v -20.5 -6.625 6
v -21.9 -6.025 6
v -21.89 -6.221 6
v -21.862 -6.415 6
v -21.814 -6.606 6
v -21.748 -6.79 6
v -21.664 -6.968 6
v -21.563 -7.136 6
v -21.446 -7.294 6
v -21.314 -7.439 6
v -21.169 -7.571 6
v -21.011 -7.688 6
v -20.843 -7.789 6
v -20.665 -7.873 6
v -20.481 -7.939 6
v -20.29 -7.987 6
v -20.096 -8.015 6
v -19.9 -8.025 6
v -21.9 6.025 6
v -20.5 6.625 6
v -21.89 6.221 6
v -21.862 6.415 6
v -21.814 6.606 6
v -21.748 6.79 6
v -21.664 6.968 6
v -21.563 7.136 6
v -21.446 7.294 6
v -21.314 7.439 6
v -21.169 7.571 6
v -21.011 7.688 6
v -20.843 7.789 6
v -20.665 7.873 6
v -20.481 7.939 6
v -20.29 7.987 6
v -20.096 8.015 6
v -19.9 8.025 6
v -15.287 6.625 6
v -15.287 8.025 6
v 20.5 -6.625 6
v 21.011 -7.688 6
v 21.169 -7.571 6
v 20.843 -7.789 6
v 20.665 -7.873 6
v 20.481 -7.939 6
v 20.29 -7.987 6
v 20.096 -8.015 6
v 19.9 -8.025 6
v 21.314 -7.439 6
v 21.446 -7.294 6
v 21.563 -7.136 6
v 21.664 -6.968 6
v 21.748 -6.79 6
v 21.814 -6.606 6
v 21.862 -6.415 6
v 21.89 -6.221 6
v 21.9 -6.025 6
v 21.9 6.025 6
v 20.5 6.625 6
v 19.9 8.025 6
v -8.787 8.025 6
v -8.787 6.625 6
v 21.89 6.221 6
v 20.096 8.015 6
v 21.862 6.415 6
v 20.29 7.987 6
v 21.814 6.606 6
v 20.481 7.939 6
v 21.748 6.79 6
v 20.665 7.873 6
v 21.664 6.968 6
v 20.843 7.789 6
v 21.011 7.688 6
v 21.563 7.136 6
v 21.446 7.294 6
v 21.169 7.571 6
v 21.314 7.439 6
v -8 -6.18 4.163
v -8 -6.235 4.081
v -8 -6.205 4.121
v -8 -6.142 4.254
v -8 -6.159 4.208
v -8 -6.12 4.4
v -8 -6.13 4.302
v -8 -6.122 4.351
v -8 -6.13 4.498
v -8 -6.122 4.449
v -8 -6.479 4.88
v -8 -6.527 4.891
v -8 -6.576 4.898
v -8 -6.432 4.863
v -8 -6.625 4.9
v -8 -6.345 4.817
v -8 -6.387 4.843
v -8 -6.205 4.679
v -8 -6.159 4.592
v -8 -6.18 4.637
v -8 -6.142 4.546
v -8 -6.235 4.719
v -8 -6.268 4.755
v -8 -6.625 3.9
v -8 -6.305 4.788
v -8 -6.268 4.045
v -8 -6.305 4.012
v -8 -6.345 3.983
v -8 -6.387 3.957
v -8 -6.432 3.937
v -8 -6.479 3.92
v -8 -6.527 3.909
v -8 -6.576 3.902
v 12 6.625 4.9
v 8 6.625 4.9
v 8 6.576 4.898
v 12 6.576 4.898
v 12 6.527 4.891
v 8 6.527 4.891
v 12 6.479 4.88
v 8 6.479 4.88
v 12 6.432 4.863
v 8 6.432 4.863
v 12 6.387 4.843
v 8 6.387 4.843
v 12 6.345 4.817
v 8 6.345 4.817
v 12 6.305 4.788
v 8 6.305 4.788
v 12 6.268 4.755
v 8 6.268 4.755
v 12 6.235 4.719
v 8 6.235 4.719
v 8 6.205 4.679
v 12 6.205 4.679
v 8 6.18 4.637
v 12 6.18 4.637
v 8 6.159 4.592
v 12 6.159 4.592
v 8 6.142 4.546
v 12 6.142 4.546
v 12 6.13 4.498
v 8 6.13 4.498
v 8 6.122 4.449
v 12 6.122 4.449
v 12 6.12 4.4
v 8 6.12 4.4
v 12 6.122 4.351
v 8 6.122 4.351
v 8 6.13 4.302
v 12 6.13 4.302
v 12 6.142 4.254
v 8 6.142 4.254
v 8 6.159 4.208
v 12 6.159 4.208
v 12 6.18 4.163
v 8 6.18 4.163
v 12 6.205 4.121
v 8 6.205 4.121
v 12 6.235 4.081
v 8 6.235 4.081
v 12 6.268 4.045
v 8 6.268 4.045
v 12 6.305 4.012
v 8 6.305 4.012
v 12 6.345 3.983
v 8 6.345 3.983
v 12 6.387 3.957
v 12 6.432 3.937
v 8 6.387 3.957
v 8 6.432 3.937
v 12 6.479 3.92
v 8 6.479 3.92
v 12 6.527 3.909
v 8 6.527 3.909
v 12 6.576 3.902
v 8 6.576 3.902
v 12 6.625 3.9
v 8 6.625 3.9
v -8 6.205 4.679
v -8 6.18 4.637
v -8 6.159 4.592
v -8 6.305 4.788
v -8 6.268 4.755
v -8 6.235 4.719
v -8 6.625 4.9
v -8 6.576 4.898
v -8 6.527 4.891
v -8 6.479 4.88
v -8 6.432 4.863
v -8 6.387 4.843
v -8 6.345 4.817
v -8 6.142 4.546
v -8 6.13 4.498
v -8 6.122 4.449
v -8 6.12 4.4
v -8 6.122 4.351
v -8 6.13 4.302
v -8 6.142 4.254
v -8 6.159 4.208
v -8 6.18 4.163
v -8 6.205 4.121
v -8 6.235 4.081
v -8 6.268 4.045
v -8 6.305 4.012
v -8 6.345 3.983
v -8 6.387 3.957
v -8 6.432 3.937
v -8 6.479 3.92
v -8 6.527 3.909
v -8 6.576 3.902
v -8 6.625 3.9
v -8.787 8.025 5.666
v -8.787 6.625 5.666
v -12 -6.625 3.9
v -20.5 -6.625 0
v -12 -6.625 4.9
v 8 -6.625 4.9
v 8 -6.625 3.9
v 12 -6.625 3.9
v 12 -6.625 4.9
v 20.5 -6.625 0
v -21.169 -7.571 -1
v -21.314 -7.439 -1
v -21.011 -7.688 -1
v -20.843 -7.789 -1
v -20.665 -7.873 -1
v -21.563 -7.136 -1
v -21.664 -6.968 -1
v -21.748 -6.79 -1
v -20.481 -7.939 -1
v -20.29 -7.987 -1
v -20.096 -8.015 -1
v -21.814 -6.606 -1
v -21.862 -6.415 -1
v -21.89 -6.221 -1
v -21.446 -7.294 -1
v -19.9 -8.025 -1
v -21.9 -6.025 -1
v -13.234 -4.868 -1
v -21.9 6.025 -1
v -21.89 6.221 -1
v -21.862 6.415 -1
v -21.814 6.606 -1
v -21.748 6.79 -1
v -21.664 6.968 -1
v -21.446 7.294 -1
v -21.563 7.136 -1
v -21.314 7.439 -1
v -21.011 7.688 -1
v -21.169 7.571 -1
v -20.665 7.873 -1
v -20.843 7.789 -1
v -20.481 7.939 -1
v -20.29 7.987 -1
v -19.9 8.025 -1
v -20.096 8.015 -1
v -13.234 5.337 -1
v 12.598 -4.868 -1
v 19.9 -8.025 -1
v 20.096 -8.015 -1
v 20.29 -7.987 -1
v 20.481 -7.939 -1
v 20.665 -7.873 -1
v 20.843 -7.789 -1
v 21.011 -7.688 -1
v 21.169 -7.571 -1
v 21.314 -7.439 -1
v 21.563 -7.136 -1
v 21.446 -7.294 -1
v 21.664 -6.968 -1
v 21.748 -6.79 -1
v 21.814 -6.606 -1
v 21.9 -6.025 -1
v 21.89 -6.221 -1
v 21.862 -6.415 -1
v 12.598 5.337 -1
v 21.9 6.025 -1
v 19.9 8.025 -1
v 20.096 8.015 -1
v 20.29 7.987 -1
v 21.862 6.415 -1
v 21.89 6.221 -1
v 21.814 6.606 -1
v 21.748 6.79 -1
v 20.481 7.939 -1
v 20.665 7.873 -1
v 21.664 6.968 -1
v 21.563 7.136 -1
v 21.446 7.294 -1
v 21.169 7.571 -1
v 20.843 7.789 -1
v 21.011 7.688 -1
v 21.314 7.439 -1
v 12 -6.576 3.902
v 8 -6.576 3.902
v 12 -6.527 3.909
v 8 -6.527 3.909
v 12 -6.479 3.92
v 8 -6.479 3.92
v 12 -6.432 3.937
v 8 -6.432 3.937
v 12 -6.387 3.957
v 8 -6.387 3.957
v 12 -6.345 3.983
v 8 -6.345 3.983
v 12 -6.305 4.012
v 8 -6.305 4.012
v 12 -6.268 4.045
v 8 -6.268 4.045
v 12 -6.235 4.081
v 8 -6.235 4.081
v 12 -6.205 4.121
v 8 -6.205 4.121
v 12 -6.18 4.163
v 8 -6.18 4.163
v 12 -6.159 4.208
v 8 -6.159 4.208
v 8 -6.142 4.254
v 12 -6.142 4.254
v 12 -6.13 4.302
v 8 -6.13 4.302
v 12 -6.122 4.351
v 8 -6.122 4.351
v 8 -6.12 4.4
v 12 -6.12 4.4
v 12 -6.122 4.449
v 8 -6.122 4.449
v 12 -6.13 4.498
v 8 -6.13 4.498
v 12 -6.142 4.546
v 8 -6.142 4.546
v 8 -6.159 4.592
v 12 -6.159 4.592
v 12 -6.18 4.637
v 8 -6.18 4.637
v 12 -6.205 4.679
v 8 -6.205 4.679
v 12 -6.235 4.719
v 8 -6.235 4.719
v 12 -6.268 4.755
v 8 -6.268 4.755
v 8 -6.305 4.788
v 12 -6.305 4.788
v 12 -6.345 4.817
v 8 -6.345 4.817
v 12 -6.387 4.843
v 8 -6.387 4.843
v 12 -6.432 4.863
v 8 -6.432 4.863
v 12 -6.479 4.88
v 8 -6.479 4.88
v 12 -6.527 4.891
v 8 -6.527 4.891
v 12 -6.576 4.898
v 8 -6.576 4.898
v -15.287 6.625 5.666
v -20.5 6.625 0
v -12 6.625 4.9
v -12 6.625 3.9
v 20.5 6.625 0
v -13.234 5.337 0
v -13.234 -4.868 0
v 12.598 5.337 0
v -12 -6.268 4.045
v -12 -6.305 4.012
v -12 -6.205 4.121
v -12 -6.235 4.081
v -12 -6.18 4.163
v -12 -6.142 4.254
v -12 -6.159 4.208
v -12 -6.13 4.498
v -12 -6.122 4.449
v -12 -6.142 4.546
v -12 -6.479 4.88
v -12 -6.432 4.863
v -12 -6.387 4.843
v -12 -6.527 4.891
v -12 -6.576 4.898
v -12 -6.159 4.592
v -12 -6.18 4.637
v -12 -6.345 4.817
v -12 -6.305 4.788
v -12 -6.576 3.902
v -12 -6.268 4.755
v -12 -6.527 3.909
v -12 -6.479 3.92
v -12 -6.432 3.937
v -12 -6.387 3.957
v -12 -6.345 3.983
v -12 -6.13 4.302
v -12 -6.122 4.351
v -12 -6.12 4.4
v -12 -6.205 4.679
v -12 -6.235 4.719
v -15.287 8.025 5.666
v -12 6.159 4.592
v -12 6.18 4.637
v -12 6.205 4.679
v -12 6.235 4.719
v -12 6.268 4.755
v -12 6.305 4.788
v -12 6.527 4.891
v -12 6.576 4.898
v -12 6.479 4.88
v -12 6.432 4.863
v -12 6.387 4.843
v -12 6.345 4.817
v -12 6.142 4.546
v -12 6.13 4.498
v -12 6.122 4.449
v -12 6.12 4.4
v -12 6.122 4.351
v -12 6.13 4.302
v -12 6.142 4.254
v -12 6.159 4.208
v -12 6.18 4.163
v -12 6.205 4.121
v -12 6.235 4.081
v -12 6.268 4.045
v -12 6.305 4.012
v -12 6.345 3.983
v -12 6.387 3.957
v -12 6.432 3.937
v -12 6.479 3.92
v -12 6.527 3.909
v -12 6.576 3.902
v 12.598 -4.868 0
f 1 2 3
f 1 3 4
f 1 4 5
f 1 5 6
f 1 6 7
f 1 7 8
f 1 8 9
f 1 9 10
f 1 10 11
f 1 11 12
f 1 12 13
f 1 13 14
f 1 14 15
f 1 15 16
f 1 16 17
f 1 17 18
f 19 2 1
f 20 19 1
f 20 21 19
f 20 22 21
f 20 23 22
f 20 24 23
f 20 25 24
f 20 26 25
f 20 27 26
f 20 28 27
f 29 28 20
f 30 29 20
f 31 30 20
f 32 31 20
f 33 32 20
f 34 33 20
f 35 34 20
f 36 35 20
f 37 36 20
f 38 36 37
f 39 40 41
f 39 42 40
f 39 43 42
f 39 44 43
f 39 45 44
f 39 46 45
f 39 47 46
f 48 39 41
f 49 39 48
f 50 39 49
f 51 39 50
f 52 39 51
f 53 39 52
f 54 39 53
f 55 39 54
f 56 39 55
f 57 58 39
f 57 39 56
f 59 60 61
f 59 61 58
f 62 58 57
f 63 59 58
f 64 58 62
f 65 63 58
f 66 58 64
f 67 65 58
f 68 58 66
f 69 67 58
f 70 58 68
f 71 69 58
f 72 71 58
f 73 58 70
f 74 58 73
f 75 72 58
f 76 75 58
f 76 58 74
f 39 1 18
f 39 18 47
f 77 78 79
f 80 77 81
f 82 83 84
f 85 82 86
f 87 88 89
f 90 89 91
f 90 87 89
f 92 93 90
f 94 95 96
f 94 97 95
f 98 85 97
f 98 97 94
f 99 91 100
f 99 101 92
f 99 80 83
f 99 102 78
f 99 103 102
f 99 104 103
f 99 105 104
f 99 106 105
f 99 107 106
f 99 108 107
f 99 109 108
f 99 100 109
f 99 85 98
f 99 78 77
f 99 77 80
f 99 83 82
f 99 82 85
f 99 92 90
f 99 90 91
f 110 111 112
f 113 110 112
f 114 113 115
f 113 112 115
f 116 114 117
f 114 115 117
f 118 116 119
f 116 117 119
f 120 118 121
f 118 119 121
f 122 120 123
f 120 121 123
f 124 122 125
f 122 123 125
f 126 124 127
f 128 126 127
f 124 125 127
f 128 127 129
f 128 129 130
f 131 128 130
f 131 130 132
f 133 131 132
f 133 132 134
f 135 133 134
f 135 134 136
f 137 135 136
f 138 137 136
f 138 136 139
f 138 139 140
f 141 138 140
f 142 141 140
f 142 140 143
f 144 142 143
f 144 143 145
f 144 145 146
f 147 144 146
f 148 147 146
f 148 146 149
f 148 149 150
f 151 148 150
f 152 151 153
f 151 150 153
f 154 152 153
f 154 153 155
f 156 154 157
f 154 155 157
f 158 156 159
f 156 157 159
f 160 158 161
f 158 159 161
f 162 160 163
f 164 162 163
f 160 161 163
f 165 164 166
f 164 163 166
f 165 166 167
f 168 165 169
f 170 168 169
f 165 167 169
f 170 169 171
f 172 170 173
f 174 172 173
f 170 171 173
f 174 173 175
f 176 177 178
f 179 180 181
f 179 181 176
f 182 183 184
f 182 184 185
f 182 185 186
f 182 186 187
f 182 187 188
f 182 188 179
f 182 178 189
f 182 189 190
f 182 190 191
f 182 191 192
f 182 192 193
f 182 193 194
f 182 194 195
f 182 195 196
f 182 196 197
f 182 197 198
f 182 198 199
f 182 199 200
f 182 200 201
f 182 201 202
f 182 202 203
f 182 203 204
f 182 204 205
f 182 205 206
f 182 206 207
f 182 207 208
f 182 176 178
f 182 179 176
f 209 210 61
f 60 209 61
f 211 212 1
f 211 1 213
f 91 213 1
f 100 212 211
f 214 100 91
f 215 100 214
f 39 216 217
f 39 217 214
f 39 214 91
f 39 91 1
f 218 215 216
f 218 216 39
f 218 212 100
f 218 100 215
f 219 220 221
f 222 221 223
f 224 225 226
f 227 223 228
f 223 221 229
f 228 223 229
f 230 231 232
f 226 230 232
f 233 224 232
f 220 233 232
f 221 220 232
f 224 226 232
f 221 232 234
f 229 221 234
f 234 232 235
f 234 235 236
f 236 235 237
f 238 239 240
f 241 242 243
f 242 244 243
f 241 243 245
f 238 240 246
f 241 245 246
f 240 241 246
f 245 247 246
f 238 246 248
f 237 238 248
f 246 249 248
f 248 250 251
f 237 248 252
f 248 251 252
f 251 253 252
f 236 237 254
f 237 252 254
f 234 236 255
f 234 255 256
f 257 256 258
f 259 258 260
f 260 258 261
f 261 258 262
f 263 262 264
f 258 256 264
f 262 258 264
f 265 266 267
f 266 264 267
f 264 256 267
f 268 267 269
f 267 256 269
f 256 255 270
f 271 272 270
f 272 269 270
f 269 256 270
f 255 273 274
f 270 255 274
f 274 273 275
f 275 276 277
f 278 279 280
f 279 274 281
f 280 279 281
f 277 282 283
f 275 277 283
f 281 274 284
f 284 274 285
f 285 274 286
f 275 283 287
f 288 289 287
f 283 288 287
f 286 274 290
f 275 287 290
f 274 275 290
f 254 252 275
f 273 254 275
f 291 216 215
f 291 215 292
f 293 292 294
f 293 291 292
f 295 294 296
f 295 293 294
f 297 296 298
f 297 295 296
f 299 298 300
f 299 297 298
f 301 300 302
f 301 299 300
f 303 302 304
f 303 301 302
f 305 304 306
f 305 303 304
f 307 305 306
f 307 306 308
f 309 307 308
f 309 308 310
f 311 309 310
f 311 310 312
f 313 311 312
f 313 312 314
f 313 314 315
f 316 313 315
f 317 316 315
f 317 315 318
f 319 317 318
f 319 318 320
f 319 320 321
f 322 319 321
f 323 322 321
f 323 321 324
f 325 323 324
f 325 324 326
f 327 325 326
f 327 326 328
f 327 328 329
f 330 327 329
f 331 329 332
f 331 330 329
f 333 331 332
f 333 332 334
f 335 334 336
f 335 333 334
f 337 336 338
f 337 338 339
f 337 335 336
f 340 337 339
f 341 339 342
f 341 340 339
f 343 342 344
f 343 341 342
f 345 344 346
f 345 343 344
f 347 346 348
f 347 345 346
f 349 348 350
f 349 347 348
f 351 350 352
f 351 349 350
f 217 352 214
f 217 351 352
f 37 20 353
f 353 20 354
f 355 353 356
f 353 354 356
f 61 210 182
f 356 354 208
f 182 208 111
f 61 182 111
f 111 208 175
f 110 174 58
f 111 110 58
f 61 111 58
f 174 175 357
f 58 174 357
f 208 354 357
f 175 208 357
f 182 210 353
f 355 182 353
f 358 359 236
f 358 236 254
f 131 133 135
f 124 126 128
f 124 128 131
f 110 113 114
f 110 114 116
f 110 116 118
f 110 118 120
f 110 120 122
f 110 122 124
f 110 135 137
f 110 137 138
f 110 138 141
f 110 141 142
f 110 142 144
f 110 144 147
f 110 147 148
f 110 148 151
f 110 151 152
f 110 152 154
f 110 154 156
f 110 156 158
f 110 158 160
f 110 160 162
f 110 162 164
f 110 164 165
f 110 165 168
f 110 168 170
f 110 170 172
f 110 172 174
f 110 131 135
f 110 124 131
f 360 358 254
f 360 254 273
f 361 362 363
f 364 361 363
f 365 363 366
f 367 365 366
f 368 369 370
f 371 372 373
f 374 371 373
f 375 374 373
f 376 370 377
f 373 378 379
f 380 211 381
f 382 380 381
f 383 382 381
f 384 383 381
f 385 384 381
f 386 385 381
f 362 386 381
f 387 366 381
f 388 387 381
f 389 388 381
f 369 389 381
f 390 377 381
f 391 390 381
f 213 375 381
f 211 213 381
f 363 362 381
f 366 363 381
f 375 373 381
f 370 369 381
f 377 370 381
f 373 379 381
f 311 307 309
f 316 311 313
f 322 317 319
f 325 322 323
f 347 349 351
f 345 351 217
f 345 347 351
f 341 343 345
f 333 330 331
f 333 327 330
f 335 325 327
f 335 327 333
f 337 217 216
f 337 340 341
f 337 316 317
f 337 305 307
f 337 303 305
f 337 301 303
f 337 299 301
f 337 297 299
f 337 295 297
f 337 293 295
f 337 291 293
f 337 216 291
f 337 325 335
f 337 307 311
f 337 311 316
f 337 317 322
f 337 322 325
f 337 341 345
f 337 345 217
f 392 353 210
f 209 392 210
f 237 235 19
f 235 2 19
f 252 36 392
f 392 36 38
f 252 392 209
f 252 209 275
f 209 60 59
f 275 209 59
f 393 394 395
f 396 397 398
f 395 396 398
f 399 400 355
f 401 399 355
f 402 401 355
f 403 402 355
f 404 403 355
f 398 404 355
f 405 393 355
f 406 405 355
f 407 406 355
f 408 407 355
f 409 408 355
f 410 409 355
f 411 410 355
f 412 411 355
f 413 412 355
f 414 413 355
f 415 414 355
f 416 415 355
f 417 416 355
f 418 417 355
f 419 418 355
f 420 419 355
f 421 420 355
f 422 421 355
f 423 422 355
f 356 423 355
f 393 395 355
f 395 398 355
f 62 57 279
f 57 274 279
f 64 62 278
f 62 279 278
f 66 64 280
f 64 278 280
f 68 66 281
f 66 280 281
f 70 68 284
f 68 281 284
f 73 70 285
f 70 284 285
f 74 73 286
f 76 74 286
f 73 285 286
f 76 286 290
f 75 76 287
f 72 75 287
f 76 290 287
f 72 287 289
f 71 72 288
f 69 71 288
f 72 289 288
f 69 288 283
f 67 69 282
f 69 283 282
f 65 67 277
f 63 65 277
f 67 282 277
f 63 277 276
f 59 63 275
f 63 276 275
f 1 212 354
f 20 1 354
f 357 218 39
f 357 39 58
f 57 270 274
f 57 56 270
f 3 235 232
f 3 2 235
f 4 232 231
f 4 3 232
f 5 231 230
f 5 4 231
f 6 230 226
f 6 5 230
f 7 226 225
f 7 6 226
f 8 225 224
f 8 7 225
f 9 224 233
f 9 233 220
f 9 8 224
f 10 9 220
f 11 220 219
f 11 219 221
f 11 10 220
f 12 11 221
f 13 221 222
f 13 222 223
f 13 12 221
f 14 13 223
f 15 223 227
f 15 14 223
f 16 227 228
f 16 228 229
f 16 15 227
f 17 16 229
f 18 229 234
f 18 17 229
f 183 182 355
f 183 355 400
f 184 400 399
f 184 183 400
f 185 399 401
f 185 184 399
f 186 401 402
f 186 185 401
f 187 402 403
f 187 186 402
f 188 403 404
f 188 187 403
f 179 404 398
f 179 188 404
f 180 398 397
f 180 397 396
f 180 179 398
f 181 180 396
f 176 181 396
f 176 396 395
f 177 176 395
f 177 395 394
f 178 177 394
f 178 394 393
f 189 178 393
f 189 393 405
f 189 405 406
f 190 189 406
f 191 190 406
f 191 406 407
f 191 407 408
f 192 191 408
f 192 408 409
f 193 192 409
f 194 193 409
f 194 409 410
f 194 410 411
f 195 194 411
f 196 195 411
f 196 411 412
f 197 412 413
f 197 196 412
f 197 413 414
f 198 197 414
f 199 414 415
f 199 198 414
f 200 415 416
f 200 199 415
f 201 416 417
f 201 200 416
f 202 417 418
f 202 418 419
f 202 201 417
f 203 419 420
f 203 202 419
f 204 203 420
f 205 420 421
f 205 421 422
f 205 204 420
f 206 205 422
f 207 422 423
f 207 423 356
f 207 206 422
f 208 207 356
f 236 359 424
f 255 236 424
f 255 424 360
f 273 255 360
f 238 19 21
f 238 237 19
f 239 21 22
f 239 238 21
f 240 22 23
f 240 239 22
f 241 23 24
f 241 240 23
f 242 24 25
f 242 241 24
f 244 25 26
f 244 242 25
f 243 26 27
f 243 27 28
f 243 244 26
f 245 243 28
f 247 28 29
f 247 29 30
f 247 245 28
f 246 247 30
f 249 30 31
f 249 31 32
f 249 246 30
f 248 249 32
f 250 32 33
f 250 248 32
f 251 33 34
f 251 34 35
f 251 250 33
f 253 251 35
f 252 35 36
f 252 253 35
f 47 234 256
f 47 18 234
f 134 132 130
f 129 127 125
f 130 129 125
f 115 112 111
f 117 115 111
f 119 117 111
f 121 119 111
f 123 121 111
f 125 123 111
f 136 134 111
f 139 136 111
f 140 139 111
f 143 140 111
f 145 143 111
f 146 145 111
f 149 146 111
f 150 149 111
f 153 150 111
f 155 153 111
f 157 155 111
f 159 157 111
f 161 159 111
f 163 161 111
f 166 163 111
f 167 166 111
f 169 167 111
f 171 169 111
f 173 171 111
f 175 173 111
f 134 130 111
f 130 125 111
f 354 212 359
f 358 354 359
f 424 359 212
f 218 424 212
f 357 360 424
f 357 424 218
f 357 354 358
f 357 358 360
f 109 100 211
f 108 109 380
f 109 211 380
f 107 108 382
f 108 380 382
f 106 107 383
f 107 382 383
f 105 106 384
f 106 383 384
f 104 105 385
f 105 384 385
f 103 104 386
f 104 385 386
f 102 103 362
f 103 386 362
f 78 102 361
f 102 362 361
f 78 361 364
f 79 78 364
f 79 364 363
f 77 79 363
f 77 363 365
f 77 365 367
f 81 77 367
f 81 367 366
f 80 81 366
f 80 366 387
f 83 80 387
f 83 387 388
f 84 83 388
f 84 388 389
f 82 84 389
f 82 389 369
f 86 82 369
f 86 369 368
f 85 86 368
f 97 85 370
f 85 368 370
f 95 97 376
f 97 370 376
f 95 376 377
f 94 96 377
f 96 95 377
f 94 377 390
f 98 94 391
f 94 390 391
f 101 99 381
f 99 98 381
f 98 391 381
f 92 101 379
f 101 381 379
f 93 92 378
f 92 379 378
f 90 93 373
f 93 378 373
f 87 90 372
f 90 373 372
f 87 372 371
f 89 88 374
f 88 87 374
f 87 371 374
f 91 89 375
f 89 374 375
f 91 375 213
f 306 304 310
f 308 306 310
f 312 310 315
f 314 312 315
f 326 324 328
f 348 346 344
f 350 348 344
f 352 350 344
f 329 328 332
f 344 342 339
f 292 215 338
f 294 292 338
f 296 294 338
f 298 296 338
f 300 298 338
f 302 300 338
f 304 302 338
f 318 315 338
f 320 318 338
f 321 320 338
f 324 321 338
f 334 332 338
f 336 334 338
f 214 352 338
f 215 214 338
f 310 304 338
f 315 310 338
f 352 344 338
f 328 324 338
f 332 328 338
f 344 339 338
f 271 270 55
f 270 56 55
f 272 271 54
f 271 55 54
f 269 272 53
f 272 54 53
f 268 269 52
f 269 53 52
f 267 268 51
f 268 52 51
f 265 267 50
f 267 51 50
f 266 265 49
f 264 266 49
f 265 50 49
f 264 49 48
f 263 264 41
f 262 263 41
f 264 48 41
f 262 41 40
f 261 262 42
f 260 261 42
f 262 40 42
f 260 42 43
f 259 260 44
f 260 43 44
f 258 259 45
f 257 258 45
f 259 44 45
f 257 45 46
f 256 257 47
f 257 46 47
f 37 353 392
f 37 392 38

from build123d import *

# Parameters (mm, degrees)
SKETCH010_W     = 43.8
SKETCH010_H     = 16.05
SKETCH010_W_2   = 41
SKETCH010_H_2   = 13.25
PAD004_DEPTH    = 6
SKETCH011_W     = 43.8
SKETCH011_H     = 16.05
SKETCH011_W_2   = 25.832
SKETCH011_H_2   = 10.205235
PAD005_DEPTH    = 1
FILLET_R        = 2
SKETCH012_W     = 6.5
SKETCH012_H     = 4.714983
POCKET004_DEPTH = 8.026
SKETCH027_R     = 0.5
PAD006_DEPTH    = 2


with BuildPart() as part:
    # Sketch010 → Pad004 (new body)
    with BuildSketch(Plane.XY):
        Rectangle(SKETCH010_W, SKETCH010_H)
        Rectangle(SKETCH010_W_2, SKETCH010_H_2, mode=Mode.SUBTRACT)
    extrude(amount=PAD004_DEPTH)

    # Sketch011 → Pad005 (join)
    with BuildSketch(Plane.XY):
        Rectangle(SKETCH011_W, SKETCH011_H)
        with Locations((-0.318418, 0.23483)):
            Rectangle(SKETCH011_W_2, SKETCH011_H_2, mode=Mode.SUBTRACT)
    extrude(amount=-PAD005_DEPTH)

    # Fillet
    fillet_edges = [part.edges().sort_by_distance(p)[0] for p in [
        (-21.9, -8.025, 3),
        (21.9, -8.025, 3),
        (-21.9, 8.025, 3),
        (21.9, 8.025, 3),
    ]]
    fillet(fillet_edges, radius=FILLET_R)

    # Sketch012 → Pocket004 (cut, through all)
    with BuildSketch(Plane.XZ):
        with Locations((-12.036756, 8.023509)):
            Rectangle(SKETCH012_W, SKETCH012_H)
    extrude(amount=-POCKET004_DEPTH, mode=Mode.SUBTRACT)

    # Sketch027 → Pad006 (join, symmetric)
    with BuildSketch(Plane.YZ.offset(10)):
        with Locations((6.62, 4.4)):
            Circle(SKETCH027_R)
        with Locations((-6.62, 4.4)):
            Circle(SKETCH027_R)
    pad006 = extrude(amount=PAD006_DEPTH, both=True)

    # Mirrored001: Pad006 across YZ
    add(pad006.mirror(Plane.YZ))


solid = part.part
